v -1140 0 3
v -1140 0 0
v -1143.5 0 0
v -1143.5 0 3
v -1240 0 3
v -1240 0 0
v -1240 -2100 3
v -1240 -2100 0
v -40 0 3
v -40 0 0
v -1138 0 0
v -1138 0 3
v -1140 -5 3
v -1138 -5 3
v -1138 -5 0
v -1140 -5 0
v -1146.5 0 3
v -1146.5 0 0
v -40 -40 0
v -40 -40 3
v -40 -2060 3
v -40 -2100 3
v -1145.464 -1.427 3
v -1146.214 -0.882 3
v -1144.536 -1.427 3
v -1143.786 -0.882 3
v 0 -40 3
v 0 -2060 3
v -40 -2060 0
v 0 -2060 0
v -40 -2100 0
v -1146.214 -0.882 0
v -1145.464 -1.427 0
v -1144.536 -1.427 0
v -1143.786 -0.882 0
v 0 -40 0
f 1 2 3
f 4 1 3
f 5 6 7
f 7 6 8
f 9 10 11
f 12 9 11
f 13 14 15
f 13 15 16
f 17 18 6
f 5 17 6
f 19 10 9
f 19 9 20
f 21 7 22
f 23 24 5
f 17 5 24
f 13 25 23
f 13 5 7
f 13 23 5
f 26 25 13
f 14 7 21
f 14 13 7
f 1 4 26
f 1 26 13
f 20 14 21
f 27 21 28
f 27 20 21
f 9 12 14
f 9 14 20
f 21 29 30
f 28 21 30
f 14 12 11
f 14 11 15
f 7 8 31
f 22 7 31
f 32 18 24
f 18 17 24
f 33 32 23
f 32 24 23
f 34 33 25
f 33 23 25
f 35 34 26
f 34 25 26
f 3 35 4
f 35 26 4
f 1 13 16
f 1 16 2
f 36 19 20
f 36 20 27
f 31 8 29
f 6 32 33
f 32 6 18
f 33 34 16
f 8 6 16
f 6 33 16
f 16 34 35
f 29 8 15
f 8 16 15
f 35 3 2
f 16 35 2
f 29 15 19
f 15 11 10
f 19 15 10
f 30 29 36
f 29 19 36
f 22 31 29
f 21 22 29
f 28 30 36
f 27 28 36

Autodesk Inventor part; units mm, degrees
ref_plane "YZ Plane" through (0, 0, 0) normal (1, 0, 0) x (0, 1, 0)
ref_plane "XZ Plane" through (0, 0, 0) normal (0, 1, 0) x (-1, 0, 0)
ref_plane "XY Plane" through (0, 0, 0) normal (0, 0, 1) x (1, 0, 0)
sketch "Sketch1" plane through (0, 0, 0) normal (0, 0, 1) x (1, 0, 0)
  line L0 (0, 0) -> (-1240, 0)
  line L1 (-1240, 0) -> (-1240, -2100)
  line L2 (-1240, -2100) -> (0, -2100)
  line L3 (0, -2100) -> (0, 0)
  line L4 (0, 0) -> (-40, 0)
  line L5 (-40, 0) -> (-40, -40)
  line L6 (-40, -40) -> (0, -40)
  line L7 (0, -40) -> (0, 0)
  line L8 (0, -2100) -> (-40, -2100)
  line L9 (-40, -2100) -> (-40, -2060)
  line L10 (-40, -2060) -> (0, -2060)
  line L11 (0, -2060) -> (0, -2100)
  point P0 (0, -40)
  point P1 (0, -2060)
  dimension "d22" = 1240
  dimension "d23" = 2100
  dimension "d24" = 40
  dimension "d25" = 40
extrude "Plate1" add sketch "Sketch1" along normal blind 3 contours L5 L6 L3 L10 L9 L2 L1 L0
sketch "Sketch5" plane through (0, 0, 3) normal (0, 0, 1) x (1, 0, 0)
  line L0 (-1240, -2100) -> (-1240, 0) projected
  line L1 (-40, -2100) -> (-1240, -2100) projected
  line L2 (-40, -2060) -> (-40, -2100) projected
  line L3 (0, -2060) -> (-40, -2060) projected
  line L4 (0, -40) -> (0, -2060) projected
  line L5 (-40, -40) -> (0, -40) projected
  line L6 (-40, 0) -> (-40, -40) projected
  line L7 (-1240, 0) -> (-40, 0) projected
  line L8 (-1140, 0) -> (-1138, 0)
  line L9 (-1138, 0) -> (-1138, -5)
  line L10 (-1138, -5) -> (-1140, -5)
  line L11 (-1140, -5) -> (-1140, 0)
  line L12 (-1132, 0) -> (-1130, 0)
  line L13 (-1130, 0) -> (-1130, -5)
  line L14 (-1130, -5) -> (-1132, -5)
  line L15 (-1132, -5) -> (-1132, 0)
  line L16 (-1136, 0) -> (-1134, 0)
  line L17 (-1134, 0) -> (-1134, -5)
  line L18 (-1134, -5) -> (-1136, -5)
  line L19 (-1136, -5) -> (-1136, 0)
  line L20 (-1240, 0) -> (-40, 0) projected
  line L21 (-1138, -2.5) -> (-1136, -2.5)
  line L22 (-1128, 0) -> (-1125, 0)
  line L23 (-1134, -2.5) -> (-1132, -2.5)
  line L24 (-1128, 0) -> (-1126.9884, -4.6072)
  arc A0 (-1126.9884, -4.6072) -> (-1126.0116, -4.6072) centre (-1126.5, -4.5) ccw
  line L25 (-1126.0116, -4.6072) -> (-1125, 0)
  line L26 (-1130, 0) -> (-1128, 0)
  line L27 (-1123, 0) -> (-1121, 0)
  line L28 (-1121, 0) -> (-1121, -5)
  line L29 (-1121, -5) -> (-1123, -5)
  line L30 (-1123, -5) -> (-1123, 0)
  line L31 (-1115, 0) -> (-1113, 0)
  line L32 (-1113, 0) -> (-1113, -5)
  line L33 (-1113, -5) -> (-1115, -5)
  line L34 (-1115, -5) -> (-1115, 0)
  line L35 (-1119, 0) -> (-1117, 0)
  line L36 (-1117, 0) -> (-1117, -5)
  line L37 (-1117, -5) -> (-1119, -5)
  line L38 (-1119, -5) -> (-1119, 0)
  line L39 (-1121, -2.5) -> (-1119, -2.5)
  line L40 (-1117, -2.5) -> (-1115, -2.5)
  line L41 (-1125, 0) -> (-1123, 0)
  line L42 (-40, 0) -> (-1240, 0) projected
  circle A1 centre (-1145, 0) radius 1.5
  point P0 (0, 0)
  point P1 (-1131, 0)
  point P2 (-1135, 0)
  point P3 (-1126.5, 0)
  point P4 (-1114, 0)
  point P5 (-1118, 0)
  point P6 (-1122, 0)
  point P7 (-1143.5, 0)
  point P8 (-1146.5, 0)
  dimension "d34" = 2
  dimension "d35" = 5
  dimension "d36" = 0.5
  dimension "d37" = 100
  dimension "d40" = 3
  dimension "d41" = 2
  dimension "d42" = 5
  dimension "d43" = 3
  dimension "d44" = 5
extrude "Cut1" cut sketch "Sketch5" against normal blind 3 contours L7 A1 | L7 L9 L10 L11 picked at (-1145.0603, -0.4964)
equation "\"d25\" = d24"
equation "\"d36\" = 0.25 * d34"
equation "\"d38\" = Thickness"
equation "\"d2\" = Thickness"
equation "\"BendReliefWidth\" = Thickness"
equation "\"BendReliefDepth\" = 0.5 * Thickness"
equation "\"CornerReliefSize\" = 4 * Thickness"
equation "\"MinimumRemnant\" = 2 * Thickness"
equation "\"TransitionRadius\" = BendRadius"
equation "\"JacobiRadiusSize\" = BendRadius"
equation "\"GapSize\" = Thickness"
equation "\"Thickness\" = 3"
equation "\"BendRadius\" = 5"
properties part number "GnG frame 1.1 floor sheet" material "Stainless Steel"
